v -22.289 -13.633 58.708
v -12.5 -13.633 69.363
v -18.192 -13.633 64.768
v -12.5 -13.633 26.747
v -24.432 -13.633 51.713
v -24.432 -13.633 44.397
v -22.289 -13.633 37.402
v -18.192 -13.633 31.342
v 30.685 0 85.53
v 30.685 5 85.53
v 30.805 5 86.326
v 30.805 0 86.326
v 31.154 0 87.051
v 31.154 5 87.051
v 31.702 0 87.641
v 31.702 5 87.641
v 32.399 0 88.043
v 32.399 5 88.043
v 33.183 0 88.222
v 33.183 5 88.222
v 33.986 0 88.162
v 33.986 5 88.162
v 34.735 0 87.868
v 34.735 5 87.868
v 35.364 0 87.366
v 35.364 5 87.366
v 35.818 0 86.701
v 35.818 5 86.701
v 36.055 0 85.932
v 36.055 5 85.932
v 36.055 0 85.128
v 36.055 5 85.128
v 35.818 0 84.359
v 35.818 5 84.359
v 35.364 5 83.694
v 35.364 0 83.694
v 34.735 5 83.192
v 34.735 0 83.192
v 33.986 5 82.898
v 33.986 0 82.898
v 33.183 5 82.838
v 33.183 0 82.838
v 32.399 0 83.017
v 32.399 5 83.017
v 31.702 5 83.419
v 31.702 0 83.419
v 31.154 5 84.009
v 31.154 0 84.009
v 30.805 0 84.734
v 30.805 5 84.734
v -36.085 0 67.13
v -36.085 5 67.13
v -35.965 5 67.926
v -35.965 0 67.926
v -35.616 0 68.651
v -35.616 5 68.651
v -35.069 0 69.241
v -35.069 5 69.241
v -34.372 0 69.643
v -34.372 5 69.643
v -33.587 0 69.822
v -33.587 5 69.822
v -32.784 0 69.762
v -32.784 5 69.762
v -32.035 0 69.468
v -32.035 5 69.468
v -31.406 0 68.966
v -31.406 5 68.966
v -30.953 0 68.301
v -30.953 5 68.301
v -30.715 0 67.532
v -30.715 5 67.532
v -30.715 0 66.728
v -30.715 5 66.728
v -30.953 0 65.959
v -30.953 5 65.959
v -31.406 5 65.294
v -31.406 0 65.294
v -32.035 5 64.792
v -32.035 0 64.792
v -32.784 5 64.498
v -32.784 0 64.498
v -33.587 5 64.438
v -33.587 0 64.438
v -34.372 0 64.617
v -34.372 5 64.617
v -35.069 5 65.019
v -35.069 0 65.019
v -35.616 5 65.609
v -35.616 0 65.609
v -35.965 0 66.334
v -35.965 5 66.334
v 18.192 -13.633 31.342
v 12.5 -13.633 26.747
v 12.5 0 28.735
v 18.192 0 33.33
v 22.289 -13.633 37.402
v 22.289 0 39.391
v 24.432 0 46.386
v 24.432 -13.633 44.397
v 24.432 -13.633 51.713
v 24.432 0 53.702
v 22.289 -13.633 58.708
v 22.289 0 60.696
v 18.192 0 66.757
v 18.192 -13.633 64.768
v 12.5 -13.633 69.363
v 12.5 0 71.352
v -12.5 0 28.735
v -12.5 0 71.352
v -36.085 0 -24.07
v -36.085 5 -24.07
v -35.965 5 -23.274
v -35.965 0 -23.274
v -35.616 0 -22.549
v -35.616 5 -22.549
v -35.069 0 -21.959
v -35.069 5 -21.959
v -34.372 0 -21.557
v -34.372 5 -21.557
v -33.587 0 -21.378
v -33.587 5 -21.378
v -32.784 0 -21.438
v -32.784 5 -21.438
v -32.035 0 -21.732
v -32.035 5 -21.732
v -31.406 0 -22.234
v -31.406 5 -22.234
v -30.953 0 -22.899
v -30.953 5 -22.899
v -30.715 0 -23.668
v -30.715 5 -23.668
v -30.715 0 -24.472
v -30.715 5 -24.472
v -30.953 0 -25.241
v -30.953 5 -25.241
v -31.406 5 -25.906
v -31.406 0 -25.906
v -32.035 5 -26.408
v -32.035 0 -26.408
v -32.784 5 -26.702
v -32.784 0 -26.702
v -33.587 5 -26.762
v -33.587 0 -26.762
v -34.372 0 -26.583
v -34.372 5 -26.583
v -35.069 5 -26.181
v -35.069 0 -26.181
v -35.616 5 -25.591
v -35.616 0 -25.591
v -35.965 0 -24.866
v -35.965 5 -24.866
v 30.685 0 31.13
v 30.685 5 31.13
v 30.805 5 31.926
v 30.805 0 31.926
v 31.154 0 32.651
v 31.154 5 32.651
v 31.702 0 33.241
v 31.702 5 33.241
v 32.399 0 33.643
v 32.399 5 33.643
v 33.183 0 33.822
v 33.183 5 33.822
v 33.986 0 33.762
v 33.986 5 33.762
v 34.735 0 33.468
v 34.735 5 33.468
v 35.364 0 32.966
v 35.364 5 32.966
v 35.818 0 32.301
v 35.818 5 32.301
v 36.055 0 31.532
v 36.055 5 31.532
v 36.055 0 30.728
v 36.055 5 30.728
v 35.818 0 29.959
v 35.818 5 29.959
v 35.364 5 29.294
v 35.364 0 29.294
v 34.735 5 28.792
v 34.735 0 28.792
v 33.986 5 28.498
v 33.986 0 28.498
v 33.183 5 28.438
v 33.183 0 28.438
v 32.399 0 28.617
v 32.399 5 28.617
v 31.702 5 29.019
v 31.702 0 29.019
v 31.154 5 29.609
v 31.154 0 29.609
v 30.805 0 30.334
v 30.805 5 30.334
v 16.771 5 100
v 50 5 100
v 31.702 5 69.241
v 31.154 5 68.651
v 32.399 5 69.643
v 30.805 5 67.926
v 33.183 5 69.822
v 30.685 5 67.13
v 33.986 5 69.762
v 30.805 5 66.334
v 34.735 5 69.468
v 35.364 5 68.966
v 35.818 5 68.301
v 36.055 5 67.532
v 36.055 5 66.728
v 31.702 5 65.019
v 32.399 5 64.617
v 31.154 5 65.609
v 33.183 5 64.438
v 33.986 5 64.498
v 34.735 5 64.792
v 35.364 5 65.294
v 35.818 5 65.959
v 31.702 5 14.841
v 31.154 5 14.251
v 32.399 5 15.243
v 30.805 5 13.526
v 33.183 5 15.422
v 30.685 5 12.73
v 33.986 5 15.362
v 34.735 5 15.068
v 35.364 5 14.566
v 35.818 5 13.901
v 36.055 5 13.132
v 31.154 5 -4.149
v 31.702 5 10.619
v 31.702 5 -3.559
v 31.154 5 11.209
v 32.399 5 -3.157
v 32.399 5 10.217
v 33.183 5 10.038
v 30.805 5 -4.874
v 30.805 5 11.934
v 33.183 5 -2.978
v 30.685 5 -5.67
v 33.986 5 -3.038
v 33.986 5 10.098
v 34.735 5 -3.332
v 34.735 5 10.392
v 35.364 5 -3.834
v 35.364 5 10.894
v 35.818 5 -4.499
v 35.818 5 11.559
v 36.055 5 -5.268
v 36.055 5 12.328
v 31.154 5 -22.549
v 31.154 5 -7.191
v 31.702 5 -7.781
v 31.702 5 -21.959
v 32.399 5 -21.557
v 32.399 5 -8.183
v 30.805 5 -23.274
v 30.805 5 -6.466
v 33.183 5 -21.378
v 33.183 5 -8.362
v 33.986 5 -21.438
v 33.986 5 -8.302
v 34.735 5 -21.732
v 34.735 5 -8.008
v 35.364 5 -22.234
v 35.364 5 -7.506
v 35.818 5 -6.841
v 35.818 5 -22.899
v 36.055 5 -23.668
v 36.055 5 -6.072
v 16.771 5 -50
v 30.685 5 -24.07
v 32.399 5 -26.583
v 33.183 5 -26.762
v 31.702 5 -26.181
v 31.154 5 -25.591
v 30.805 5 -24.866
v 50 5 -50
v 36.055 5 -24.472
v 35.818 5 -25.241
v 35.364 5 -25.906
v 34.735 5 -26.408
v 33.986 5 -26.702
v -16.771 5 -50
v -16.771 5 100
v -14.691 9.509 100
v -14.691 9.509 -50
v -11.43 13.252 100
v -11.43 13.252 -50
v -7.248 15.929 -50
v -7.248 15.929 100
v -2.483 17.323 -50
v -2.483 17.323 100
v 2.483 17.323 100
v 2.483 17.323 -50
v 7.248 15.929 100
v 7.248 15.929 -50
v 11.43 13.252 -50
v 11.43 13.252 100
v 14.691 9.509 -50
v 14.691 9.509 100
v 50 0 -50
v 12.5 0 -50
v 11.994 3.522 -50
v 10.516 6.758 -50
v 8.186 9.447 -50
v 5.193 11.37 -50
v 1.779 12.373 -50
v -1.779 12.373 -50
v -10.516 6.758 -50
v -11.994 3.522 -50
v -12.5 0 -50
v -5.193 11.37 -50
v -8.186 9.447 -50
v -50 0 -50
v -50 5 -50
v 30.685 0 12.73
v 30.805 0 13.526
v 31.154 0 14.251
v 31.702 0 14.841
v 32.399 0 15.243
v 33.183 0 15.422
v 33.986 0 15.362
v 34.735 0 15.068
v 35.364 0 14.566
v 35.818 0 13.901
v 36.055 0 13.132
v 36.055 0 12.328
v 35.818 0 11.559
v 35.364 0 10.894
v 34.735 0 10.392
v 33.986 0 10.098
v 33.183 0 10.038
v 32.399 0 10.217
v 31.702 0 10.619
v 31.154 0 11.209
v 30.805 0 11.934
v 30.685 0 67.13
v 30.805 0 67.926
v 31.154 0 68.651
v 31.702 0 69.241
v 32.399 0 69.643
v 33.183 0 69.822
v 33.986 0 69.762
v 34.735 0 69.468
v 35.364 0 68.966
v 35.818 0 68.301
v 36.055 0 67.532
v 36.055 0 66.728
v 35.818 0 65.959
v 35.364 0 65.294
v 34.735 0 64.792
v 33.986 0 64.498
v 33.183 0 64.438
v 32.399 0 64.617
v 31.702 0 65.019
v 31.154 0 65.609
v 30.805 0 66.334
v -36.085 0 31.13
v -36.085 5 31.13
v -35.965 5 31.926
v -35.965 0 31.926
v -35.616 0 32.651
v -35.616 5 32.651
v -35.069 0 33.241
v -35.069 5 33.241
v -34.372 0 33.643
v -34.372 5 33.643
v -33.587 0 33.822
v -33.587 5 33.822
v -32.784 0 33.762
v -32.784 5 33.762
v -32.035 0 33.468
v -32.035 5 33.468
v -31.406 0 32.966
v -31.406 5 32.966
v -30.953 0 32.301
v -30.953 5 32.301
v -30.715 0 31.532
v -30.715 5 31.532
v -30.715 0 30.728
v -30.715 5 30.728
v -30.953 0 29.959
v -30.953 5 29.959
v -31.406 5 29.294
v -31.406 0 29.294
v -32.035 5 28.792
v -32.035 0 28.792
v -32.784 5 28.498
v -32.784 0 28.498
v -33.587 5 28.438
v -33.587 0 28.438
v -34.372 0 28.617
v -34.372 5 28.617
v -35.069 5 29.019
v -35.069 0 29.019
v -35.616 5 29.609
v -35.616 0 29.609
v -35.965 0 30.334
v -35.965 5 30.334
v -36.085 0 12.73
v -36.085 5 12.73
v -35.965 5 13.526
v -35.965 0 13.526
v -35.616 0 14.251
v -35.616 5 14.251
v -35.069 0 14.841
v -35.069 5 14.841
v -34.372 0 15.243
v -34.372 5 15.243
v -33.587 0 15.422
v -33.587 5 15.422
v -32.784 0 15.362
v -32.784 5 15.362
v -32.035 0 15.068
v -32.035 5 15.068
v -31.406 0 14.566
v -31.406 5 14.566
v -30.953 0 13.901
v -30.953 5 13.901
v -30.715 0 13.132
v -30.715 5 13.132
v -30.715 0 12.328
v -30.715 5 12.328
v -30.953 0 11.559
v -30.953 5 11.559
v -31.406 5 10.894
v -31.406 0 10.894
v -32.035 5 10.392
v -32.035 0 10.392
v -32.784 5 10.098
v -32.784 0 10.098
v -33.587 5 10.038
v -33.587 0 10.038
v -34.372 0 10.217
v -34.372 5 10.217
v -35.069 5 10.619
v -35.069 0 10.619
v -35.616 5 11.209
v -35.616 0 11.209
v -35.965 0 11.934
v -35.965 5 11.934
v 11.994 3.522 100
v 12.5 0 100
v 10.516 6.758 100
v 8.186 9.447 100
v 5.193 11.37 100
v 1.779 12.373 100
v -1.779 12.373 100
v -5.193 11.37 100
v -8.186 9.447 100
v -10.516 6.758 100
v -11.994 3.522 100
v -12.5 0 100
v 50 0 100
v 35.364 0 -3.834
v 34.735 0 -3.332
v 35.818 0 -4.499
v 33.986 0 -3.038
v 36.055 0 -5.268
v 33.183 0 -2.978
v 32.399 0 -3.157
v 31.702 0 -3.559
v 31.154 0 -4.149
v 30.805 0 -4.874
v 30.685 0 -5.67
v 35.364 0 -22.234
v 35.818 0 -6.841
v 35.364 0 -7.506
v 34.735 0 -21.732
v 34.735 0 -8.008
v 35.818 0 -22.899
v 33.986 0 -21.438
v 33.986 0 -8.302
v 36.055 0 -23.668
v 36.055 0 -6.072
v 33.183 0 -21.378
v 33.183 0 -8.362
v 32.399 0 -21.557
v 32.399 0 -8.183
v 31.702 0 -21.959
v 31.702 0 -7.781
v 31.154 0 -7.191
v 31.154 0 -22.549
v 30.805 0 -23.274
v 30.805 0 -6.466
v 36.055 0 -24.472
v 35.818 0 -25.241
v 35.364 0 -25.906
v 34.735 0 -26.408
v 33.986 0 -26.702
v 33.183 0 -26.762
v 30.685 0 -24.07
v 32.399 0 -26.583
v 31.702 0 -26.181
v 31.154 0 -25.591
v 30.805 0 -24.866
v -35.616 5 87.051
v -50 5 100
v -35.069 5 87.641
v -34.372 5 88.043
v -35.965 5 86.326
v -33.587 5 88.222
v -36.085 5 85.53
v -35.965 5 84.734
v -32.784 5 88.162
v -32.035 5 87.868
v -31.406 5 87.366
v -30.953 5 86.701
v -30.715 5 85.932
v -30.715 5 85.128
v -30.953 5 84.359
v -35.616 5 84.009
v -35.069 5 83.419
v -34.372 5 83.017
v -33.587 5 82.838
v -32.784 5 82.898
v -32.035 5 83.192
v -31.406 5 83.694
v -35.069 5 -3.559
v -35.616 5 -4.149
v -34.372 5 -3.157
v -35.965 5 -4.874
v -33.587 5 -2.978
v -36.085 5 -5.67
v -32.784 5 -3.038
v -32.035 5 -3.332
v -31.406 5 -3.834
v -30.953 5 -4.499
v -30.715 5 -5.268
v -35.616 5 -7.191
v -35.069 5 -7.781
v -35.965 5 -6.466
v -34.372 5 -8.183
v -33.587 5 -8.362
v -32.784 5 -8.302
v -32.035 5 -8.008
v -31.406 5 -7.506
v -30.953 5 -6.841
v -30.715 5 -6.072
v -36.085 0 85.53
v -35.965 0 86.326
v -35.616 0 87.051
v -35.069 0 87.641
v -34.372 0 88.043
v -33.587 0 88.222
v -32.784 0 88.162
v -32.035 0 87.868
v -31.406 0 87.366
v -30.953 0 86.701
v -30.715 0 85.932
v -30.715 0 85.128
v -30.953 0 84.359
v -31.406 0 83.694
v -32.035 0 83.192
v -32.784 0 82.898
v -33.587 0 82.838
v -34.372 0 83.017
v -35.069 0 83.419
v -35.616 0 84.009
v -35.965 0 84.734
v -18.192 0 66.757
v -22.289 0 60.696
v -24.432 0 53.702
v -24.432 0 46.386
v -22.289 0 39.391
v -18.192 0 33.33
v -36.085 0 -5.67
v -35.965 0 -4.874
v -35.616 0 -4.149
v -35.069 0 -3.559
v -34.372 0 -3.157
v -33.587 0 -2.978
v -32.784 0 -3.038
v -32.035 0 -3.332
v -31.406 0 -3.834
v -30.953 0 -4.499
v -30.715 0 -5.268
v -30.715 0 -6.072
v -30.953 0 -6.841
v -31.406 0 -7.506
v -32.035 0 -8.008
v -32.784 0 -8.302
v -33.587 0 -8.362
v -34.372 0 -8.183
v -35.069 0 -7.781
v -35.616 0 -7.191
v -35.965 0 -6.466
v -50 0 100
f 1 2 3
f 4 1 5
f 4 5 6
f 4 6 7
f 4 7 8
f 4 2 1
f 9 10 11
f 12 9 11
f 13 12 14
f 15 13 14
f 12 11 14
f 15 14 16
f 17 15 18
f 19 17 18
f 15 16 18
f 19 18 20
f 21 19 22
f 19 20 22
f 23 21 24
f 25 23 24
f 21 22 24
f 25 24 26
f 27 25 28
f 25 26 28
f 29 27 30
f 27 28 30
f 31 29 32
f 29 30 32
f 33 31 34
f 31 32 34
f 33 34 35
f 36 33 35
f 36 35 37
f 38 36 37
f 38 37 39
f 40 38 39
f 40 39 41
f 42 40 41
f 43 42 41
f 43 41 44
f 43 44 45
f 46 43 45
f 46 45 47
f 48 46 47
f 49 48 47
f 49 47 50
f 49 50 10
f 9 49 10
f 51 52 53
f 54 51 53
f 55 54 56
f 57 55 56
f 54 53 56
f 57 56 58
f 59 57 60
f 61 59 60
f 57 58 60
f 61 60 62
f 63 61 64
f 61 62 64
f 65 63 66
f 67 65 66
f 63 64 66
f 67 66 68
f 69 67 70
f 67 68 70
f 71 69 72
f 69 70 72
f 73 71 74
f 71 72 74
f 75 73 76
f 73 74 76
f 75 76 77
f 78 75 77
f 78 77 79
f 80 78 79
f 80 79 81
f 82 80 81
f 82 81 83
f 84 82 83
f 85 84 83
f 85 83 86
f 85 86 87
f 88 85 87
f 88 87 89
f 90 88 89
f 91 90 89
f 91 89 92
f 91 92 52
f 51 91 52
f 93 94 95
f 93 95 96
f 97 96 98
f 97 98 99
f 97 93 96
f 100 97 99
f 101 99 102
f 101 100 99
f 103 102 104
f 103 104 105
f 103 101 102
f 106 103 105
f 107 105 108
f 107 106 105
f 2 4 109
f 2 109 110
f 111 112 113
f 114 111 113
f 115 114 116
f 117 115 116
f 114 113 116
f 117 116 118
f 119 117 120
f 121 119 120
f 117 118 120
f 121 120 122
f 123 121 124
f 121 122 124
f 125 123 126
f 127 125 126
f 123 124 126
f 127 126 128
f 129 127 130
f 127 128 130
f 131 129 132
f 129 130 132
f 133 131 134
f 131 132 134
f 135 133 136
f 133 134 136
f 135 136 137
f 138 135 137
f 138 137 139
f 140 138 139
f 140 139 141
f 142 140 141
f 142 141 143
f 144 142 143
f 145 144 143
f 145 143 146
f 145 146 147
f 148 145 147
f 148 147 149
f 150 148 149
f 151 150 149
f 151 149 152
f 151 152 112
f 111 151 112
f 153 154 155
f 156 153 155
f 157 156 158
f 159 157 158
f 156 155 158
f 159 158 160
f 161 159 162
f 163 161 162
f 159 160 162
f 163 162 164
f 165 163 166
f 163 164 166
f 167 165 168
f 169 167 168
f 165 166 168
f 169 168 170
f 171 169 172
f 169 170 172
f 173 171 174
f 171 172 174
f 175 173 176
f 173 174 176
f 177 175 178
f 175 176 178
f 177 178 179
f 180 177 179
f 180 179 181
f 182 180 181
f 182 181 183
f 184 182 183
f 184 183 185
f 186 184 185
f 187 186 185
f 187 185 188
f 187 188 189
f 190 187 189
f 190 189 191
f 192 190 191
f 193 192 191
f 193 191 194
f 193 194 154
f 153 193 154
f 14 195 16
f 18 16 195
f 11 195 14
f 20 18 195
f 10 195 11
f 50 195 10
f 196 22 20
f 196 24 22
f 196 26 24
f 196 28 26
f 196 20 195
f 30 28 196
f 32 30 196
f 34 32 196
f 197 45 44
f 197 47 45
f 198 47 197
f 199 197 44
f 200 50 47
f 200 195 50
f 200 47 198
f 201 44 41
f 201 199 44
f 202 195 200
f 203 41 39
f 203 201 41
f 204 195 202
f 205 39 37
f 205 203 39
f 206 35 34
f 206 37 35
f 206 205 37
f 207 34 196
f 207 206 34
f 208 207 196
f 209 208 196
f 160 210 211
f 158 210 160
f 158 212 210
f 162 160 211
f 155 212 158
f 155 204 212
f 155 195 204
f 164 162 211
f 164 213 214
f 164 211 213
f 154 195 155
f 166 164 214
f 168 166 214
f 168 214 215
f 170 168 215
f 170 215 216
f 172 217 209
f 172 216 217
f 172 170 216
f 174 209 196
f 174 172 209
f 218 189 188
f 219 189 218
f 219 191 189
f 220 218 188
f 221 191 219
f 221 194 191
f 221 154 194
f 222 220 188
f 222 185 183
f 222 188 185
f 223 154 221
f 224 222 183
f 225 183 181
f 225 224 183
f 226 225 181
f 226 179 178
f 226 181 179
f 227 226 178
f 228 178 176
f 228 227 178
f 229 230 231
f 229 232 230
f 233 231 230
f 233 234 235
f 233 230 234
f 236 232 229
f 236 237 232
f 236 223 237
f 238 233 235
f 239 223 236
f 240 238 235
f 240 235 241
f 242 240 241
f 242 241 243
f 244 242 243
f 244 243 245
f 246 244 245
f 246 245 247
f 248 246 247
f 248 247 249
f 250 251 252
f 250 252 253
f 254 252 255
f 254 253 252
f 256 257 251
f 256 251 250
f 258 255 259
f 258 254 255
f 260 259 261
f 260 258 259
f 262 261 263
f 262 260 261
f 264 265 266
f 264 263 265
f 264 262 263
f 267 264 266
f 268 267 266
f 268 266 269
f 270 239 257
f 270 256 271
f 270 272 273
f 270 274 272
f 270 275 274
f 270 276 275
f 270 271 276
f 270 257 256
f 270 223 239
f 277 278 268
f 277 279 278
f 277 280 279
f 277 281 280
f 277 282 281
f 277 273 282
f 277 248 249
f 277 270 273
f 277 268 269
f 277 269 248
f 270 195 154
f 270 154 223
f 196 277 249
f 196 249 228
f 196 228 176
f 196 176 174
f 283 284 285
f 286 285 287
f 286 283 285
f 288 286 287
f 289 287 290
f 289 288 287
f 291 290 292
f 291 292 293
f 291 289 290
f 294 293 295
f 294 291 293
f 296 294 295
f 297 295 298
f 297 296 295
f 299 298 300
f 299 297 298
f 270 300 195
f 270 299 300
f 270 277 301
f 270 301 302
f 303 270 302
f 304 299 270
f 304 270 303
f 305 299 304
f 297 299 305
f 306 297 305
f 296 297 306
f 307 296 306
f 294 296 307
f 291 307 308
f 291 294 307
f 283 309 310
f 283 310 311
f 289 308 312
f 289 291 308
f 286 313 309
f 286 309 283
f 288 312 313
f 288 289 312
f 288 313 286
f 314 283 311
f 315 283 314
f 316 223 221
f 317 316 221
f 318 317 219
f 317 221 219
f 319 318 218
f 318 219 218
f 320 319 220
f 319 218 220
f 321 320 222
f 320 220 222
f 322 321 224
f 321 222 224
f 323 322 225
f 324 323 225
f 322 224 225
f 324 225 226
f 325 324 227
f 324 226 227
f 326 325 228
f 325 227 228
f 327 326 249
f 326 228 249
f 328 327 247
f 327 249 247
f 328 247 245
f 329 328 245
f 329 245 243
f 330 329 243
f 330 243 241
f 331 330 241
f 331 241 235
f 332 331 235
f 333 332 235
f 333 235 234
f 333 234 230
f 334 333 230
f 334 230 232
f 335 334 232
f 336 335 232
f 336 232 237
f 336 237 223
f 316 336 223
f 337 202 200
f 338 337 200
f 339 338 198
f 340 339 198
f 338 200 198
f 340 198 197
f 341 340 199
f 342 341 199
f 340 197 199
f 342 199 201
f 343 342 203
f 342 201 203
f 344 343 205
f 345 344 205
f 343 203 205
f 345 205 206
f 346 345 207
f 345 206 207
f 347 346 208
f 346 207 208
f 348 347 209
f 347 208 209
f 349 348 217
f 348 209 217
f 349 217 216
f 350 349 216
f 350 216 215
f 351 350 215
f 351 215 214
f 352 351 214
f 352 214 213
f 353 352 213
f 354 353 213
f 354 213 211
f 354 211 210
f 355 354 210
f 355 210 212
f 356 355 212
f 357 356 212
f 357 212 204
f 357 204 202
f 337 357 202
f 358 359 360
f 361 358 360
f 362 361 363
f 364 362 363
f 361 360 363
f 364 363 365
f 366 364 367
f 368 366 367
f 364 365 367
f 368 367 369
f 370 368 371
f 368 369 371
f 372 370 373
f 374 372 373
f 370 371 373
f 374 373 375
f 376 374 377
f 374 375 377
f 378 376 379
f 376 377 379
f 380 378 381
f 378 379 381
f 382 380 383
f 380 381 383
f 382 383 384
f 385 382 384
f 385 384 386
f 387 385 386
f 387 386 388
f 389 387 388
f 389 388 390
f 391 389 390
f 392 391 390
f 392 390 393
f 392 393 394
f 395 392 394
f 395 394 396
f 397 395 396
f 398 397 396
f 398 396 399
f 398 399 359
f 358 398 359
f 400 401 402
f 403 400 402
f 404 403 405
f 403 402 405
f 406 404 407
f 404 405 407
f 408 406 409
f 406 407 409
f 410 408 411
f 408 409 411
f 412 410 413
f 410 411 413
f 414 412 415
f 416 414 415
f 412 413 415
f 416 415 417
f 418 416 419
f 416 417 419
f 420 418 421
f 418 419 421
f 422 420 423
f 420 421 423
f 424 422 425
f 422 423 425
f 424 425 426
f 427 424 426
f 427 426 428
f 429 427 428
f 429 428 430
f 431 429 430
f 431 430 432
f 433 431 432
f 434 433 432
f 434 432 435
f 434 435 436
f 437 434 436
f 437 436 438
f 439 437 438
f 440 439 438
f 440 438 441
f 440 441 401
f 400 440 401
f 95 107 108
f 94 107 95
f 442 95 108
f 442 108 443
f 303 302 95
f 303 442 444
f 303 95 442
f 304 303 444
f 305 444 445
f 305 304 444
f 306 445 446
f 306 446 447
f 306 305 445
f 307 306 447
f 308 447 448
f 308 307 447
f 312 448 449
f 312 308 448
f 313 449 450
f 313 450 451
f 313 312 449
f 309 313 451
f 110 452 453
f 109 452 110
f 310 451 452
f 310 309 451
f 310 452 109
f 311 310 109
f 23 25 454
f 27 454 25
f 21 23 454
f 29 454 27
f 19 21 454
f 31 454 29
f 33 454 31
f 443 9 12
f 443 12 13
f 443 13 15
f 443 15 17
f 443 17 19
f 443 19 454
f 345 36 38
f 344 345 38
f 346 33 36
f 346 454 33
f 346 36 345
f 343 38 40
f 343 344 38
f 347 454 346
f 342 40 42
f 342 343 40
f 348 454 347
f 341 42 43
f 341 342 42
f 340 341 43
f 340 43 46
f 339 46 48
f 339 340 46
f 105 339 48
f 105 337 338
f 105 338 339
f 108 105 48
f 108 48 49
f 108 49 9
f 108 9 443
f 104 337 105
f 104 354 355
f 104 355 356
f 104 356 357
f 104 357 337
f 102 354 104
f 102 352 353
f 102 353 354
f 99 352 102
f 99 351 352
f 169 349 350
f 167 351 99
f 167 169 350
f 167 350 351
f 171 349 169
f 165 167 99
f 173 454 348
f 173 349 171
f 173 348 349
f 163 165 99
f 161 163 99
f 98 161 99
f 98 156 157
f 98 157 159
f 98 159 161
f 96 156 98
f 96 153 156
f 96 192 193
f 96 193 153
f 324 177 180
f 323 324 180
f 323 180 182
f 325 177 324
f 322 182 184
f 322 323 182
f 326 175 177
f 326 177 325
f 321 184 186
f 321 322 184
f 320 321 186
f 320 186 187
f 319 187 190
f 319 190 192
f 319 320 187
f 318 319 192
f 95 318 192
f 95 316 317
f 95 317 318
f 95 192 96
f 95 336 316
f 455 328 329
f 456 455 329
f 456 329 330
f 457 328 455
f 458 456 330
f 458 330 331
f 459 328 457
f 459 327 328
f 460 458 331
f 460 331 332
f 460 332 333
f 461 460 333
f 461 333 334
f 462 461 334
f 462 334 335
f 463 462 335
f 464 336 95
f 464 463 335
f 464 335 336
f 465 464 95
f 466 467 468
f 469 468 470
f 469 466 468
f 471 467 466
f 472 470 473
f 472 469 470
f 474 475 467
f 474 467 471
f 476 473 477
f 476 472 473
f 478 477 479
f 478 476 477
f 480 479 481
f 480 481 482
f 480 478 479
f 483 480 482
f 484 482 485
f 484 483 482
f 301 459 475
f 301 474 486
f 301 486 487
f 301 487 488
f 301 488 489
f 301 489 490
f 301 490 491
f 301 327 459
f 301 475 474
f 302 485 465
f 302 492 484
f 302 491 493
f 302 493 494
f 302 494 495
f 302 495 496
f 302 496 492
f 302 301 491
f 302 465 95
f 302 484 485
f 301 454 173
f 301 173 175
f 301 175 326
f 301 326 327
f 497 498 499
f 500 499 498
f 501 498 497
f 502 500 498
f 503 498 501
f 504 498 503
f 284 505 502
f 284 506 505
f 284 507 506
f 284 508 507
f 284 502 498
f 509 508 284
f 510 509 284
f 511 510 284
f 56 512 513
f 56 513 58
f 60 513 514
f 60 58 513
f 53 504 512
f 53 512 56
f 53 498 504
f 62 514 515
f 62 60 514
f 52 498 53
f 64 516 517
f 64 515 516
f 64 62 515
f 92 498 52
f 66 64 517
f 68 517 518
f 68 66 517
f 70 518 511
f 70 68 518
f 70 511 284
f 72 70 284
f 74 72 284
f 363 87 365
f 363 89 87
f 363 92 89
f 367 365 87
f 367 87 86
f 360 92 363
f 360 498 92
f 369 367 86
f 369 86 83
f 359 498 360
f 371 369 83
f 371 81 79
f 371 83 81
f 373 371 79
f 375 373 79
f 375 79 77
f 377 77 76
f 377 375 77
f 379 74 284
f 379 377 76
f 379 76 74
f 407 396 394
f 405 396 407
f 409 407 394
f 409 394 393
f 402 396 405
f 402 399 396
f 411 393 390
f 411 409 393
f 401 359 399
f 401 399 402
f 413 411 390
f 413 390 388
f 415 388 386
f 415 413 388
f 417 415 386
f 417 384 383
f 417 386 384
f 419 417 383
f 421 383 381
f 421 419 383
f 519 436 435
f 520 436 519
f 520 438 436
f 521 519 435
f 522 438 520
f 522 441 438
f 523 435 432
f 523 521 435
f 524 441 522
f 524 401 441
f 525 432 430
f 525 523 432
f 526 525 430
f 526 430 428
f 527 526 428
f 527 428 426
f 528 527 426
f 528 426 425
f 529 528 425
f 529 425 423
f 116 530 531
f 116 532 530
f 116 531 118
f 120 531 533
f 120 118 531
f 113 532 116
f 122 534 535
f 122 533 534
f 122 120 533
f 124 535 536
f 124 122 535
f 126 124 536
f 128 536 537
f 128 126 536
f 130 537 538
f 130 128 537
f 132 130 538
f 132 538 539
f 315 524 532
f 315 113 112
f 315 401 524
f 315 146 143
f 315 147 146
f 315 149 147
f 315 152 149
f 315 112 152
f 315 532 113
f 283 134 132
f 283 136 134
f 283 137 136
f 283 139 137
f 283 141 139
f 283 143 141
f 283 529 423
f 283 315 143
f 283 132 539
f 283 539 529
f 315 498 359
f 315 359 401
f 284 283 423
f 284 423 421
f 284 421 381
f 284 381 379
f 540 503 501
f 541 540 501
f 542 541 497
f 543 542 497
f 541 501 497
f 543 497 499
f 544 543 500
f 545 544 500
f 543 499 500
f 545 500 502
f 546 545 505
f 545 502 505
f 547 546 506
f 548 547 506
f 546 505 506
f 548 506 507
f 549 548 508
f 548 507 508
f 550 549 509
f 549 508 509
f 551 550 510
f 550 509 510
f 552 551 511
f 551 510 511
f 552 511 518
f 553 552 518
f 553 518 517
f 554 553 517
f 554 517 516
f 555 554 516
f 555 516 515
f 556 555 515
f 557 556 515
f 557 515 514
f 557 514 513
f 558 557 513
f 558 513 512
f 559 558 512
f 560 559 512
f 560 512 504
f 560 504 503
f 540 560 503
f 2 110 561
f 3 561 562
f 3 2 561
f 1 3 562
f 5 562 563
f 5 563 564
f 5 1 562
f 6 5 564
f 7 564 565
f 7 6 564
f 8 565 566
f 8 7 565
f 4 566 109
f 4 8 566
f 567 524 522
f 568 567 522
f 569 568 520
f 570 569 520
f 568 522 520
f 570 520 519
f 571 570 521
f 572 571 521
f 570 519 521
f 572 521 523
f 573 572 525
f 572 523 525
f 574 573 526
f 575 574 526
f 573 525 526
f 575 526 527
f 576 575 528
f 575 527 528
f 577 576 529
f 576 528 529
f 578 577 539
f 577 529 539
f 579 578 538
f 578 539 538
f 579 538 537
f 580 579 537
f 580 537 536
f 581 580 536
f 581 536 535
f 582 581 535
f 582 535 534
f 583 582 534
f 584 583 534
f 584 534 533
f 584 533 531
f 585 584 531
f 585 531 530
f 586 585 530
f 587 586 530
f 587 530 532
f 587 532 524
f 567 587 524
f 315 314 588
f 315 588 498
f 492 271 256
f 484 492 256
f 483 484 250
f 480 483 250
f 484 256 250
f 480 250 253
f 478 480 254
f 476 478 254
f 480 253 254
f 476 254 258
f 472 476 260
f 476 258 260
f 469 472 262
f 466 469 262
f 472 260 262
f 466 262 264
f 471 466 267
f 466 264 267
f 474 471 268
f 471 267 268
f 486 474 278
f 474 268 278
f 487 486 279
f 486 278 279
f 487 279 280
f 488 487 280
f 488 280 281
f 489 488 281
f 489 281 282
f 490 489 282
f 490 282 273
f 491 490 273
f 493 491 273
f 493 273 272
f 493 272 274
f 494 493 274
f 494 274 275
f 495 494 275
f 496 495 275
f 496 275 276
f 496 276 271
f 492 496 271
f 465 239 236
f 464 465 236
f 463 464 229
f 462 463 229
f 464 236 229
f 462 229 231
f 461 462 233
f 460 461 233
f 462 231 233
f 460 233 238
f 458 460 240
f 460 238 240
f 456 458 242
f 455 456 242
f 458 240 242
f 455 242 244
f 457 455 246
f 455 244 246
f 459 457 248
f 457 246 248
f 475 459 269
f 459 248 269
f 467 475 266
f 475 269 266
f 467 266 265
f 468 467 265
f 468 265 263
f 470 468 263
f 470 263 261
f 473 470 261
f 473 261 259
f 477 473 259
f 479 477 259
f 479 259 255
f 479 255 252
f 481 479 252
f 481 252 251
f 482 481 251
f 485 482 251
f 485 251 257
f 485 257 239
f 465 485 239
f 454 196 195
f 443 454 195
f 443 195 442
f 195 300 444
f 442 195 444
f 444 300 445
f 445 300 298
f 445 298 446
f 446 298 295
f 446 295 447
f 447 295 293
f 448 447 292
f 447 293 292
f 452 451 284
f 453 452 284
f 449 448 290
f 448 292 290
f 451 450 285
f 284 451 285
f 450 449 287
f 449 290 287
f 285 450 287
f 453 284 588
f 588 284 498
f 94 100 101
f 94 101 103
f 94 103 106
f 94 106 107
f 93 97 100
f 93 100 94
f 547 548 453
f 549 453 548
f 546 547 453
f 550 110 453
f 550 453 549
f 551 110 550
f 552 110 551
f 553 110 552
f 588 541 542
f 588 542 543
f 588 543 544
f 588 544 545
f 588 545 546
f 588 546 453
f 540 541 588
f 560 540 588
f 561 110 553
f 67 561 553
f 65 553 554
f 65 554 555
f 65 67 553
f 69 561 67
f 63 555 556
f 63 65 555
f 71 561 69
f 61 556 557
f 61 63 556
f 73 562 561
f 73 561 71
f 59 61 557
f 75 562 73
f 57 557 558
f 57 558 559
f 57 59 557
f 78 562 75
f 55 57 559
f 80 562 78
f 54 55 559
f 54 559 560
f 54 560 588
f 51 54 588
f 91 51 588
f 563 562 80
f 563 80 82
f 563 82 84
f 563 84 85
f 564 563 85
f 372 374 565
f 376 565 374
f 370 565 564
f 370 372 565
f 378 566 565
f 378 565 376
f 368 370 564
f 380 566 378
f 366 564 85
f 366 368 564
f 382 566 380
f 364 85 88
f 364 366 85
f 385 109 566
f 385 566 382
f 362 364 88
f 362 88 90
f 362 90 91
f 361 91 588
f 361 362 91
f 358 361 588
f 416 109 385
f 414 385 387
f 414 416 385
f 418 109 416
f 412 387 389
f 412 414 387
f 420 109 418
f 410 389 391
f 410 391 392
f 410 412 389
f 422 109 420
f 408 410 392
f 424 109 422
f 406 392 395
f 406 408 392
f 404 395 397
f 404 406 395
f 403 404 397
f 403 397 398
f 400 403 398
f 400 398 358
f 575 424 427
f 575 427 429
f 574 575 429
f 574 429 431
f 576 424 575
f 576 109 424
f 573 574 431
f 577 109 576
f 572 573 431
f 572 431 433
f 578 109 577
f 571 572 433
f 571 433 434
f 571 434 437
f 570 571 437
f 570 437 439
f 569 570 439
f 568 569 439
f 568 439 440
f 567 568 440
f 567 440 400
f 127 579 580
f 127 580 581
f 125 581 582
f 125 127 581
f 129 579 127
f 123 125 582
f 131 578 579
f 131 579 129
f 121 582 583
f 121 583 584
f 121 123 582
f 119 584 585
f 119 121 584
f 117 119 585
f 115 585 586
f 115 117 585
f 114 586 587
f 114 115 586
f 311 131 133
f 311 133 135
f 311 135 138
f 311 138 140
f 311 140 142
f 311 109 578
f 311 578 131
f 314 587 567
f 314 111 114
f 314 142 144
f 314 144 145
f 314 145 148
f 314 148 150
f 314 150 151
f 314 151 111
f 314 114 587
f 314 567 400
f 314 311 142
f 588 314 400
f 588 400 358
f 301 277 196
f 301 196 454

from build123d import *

# Parameters (mm, degrees)
BOSS_EXTRUDE1_DEPTH      = 100
BOSS_EXTRUDE1_DEPTH_BACK = 50
CUT_EXTRUDE2_REACH       = 115.345
SKETCH6_R                = 2.7


with BuildPart() as part:
    # Sketch1 → Boss-Extrude1 (new, two sides: drawn at the far end of the back side and taken through both)
    with BuildSketch(Plane.XY.offset(-BOSS_EXTRUDE1_DEPTH_BACK)):
        with BuildLine():
            Line((-12.5, 0), (-50, 0))
            Line((-50, 0), (-50, 5))
            Line((-50, 5), (-16.770509831, 5))
            ThreePointArc((-16.770509831, 5), (0, 17.5), (16.770509831, 5))
            Line((16.770509831, 5), (50, 5))
            Line((50, 5), (50, 0))
            Line((50, 0), (12.5, 0))
            ThreePointArc((12.5, 0), (0, 12.5), (-12.5, 0))
        make_face()
    extrude(amount=BOSS_EXTRUDE1_DEPTH + BOSS_EXTRUDE1_DEPTH_BACK)

    # Sweep1: sweep along a path in Sketch4
    with BuildLine(Plane.ZY.offset(12.5)) as sweep1_path:
        Line((50.0437673, 0), (48.0549131, -13.633099982))
    # Sketch3 → Sweep1 (sweep)
    with BuildSketch(Plane.XZ):
        with BuildLine():
            Line((-12.5, 71.352170208), (-12.5, 28.735364392))
            ThreePointArc((-12.5, 28.735364392), (-24.704210866, 50.0437673), (-12.5, 71.352170208))
        make_face()
        with BuildLine():
            Line((12.5, 71.352170208), (12.5, 28.735364392))
            ThreePointArc((12.5, 28.735364392), (24.704210866, 50.0437673), (12.5, 71.352170208))
        make_face()
    sweep(path=sweep1_path.line)

    # Sketch6 → Cut-Extrude2 (cut, up to next)
    with BuildSketch(Plane(origin=(0, 5, 0), x_dir=(1, 0, 0), z_dir=(0, 1, 0)), mode=Mode.PRIVATE) as cut_extrude2_sk1:
        with Locations(Location((-33.385254916, 24.07, 0), (0, 0, 180))):
            Circle(SKETCH6_R)
    cut_extrude2_tool1 = extrude(cut_extrude2_sk1.sketch, amount=-CUT_EXTRUDE2_REACH, mode=Mode.PRIVATE) & part.part
    # Sketch6 → Cut-Extrude2 (cut, up to next)
    with BuildSketch(Plane(origin=(0, 5, 0), x_dir=(1, 0, 0), z_dir=(0, 1, 0)), mode=Mode.PRIVATE) as cut_extrude2_sk2:
        with Locations(Location((-33.385254916, 5.67, 0), (0, 0, 180))):
            Circle(SKETCH6_R)
    cut_extrude2_tool2 = extrude(cut_extrude2_sk2.sketch, amount=-CUT_EXTRUDE2_REACH, mode=Mode.PRIVATE) & part.part
    # Sketch6 → Cut-Extrude2 (cut, up to next)
    with BuildSketch(Plane(origin=(0, 5, 0), x_dir=(1, 0, 0), z_dir=(0, 1, 0)), mode=Mode.PRIVATE) as cut_extrude2_sk3:
        with Locations(Location((-33.385254916, -12.73, 0), (0, 0, 180))):
            Circle(SKETCH6_R)
    cut_extrude2_tool3 = extrude(cut_extrude2_sk3.sketch, amount=-CUT_EXTRUDE2_REACH, mode=Mode.PRIVATE) & part.part
    # Sketch6 → Cut-Extrude2 (cut, up to next)
    with BuildSketch(Plane(origin=(0, 5, 0), x_dir=(1, 0, 0), z_dir=(0, 1, 0)), mode=Mode.PRIVATE) as cut_extrude2_sk4:
        with Locations(Location((-33.385254916, -31.13, 0), (0, 0, 180))):
            Circle(SKETCH6_R)
    cut_extrude2_tool4 = extrude(cut_extrude2_sk4.sketch, amount=-CUT_EXTRUDE2_REACH, mode=Mode.PRIVATE) & part.part
    # Sketch6 → Cut-Extrude2 (cut, up to next)
    with BuildSketch(Plane(origin=(0, 5, 0), x_dir=(1, 0, 0), z_dir=(0, 1, 0)), mode=Mode.PRIVATE) as cut_extrude2_sk5:
        with Locations(Location((-33.385254916, -67.13, 0), (0, 0, 180))):
            Circle(SKETCH6_R)
    cut_extrude2_tool5 = extrude(cut_extrude2_sk5.sketch, amount=-CUT_EXTRUDE2_REACH, mode=Mode.PRIVATE) & part.part
    # Sketch6 → Cut-Extrude2 (cut, up to next)
    with BuildSketch(Plane(origin=(0, 5, 0), x_dir=(1, 0, 0), z_dir=(0, 1, 0)), mode=Mode.PRIVATE) as cut_extrude2_sk6:
        with Locations(Location((-33.385254916, -85.53, 0), (0, 0, 180))):
            Circle(SKETCH6_R)
    cut_extrude2_tool6 = extrude(cut_extrude2_sk6.sketch, amount=-CUT_EXTRUDE2_REACH, mode=Mode.PRIVATE) & part.part
    # Sketch6 → Cut-Extrude2 (cut, up to next)
    with BuildSketch(Plane(origin=(0, 5, 0), x_dir=(1, 0, 0), z_dir=(0, 1, 0)), mode=Mode.PRIVATE) as cut_extrude2_sk7:
        with Locations(Location((33.385254916, 24.07, 0), (0, 0, 180))):
            Circle(SKETCH6_R)
    cut_extrude2_tool7 = extrude(cut_extrude2_sk7.sketch, amount=-CUT_EXTRUDE2_REACH, mode=Mode.PRIVATE) & part.part
    # Sketch6 → Cut-Extrude2 (cut, up to next)
    with BuildSketch(Plane(origin=(0, 5, 0), x_dir=(1, 0, 0), z_dir=(0, 1, 0)), mode=Mode.PRIVATE) as cut_extrude2_sk8:
        with Locations(Location((33.385254916, 5.67, 0), (0, 0, 180))):
            Circle(SKETCH6_R)
    cut_extrude2_tool8 = extrude(cut_extrude2_sk8.sketch, amount=-CUT_EXTRUDE2_REACH, mode=Mode.PRIVATE) & part.part
    # Sketch6 → Cut-Extrude2 (cut, up to next)
    with BuildSketch(Plane(origin=(0, 5, 0), x_dir=(1, 0, 0), z_dir=(0, 1, 0)), mode=Mode.PRIVATE) as cut_extrude2_sk9:
        with Locations(Location((33.385254916, -31.13, 0), (0, 0, 180))):
            Circle(SKETCH6_R)
    cut_extrude2_tool9 = extrude(cut_extrude2_sk9.sketch, amount=-CUT_EXTRUDE2_REACH, mode=Mode.PRIVATE) & part.part
    # Sketch6 → Cut-Extrude2 (cut, up to next)
    with BuildSketch(Plane(origin=(0, 5, 0), x_dir=(1, 0, 0), z_dir=(0, 1, 0)), mode=Mode.PRIVATE) as cut_extrude2_sk10:
        with Locations(Location((33.385254916, -67.13, 0), (0, 0, 180))):
            Circle(SKETCH6_R)
    cut_extrude2_tool10 = extrude(cut_extrude2_sk10.sketch, amount=-CUT_EXTRUDE2_REACH, mode=Mode.PRIVATE) & part.part
    # Sketch6 → Cut-Extrude2 (cut, up to next)
    with BuildSketch(Plane(origin=(0, 5, 0), x_dir=(1, 0, 0), z_dir=(0, 1, 0)), mode=Mode.PRIVATE) as cut_extrude2_sk11:
        with Locations(Location((33.385254916, -85.53, 0), (0, 0, 180))):
            Circle(SKETCH6_R)
    cut_extrude2_tool11 = extrude(cut_extrude2_sk11.sketch, amount=-CUT_EXTRUDE2_REACH, mode=Mode.PRIVATE) & part.part
    # Sketch6 → Cut-Extrude2 (cut, up to next)
    with BuildSketch(Plane(origin=(0, 5, 0), x_dir=(1, 0, 0), z_dir=(0, 1, 0)), mode=Mode.PRIVATE) as cut_extrude2_sk12:
        with Locations(Location((33.385254916, -12.73, 0), (0, 0, 180))):
            Circle(SKETCH6_R)
    cut_extrude2_tool12 = extrude(cut_extrude2_sk12.sketch, amount=-CUT_EXTRUDE2_REACH, mode=Mode.PRIVATE) & part.part
    add(cut_extrude2_tool1.solids().sort_by_distance((-33.385255, 5, -24.07))[0], mode=Mode.SUBTRACT)
    add(cut_extrude2_tool2.solids().sort_by_distance((-33.385255, 5, -5.67))[0], mode=Mode.SUBTRACT)
    add(cut_extrude2_tool3.solids().sort_by_distance((-33.385255, 5, 12.73))[0], mode=Mode.SUBTRACT)
    add(cut_extrude2_tool4.solids().sort_by_distance((-33.385255, 5, 31.13))[0], mode=Mode.SUBTRACT)
    add(cut_extrude2_tool5.solids().sort_by_distance((-33.385255, 5, 67.13))[0], mode=Mode.SUBTRACT)
    add(cut_extrude2_tool6.solids().sort_by_distance((-33.385255, 5, 85.53))[0], mode=Mode.SUBTRACT)
    add(cut_extrude2_tool7.solids().sort_by_distance((33.385255, 5, -24.07))[0], mode=Mode.SUBTRACT)
    add(cut_extrude2_tool8.solids().sort_by_distance((33.385255, 5, -5.67))[0], mode=Mode.SUBTRACT)
    add(cut_extrude2_tool9.solids().sort_by_distance((33.385255, 5, 31.13))[0], mode=Mode.SUBTRACT)
    add(cut_extrude2_tool10.solids().sort_by_distance((33.385255, 5, 67.13))[0], mode=Mode.SUBTRACT)
    add(cut_extrude2_tool11.solids().sort_by_distance((33.385255, 5, 85.53))[0], mode=Mode.SUBTRACT)
    add(cut_extrude2_tool12.solids().sort_by_distance((33.385255, 5, 12.73))[0], mode=Mode.SUBTRACT)


solid = part.part
